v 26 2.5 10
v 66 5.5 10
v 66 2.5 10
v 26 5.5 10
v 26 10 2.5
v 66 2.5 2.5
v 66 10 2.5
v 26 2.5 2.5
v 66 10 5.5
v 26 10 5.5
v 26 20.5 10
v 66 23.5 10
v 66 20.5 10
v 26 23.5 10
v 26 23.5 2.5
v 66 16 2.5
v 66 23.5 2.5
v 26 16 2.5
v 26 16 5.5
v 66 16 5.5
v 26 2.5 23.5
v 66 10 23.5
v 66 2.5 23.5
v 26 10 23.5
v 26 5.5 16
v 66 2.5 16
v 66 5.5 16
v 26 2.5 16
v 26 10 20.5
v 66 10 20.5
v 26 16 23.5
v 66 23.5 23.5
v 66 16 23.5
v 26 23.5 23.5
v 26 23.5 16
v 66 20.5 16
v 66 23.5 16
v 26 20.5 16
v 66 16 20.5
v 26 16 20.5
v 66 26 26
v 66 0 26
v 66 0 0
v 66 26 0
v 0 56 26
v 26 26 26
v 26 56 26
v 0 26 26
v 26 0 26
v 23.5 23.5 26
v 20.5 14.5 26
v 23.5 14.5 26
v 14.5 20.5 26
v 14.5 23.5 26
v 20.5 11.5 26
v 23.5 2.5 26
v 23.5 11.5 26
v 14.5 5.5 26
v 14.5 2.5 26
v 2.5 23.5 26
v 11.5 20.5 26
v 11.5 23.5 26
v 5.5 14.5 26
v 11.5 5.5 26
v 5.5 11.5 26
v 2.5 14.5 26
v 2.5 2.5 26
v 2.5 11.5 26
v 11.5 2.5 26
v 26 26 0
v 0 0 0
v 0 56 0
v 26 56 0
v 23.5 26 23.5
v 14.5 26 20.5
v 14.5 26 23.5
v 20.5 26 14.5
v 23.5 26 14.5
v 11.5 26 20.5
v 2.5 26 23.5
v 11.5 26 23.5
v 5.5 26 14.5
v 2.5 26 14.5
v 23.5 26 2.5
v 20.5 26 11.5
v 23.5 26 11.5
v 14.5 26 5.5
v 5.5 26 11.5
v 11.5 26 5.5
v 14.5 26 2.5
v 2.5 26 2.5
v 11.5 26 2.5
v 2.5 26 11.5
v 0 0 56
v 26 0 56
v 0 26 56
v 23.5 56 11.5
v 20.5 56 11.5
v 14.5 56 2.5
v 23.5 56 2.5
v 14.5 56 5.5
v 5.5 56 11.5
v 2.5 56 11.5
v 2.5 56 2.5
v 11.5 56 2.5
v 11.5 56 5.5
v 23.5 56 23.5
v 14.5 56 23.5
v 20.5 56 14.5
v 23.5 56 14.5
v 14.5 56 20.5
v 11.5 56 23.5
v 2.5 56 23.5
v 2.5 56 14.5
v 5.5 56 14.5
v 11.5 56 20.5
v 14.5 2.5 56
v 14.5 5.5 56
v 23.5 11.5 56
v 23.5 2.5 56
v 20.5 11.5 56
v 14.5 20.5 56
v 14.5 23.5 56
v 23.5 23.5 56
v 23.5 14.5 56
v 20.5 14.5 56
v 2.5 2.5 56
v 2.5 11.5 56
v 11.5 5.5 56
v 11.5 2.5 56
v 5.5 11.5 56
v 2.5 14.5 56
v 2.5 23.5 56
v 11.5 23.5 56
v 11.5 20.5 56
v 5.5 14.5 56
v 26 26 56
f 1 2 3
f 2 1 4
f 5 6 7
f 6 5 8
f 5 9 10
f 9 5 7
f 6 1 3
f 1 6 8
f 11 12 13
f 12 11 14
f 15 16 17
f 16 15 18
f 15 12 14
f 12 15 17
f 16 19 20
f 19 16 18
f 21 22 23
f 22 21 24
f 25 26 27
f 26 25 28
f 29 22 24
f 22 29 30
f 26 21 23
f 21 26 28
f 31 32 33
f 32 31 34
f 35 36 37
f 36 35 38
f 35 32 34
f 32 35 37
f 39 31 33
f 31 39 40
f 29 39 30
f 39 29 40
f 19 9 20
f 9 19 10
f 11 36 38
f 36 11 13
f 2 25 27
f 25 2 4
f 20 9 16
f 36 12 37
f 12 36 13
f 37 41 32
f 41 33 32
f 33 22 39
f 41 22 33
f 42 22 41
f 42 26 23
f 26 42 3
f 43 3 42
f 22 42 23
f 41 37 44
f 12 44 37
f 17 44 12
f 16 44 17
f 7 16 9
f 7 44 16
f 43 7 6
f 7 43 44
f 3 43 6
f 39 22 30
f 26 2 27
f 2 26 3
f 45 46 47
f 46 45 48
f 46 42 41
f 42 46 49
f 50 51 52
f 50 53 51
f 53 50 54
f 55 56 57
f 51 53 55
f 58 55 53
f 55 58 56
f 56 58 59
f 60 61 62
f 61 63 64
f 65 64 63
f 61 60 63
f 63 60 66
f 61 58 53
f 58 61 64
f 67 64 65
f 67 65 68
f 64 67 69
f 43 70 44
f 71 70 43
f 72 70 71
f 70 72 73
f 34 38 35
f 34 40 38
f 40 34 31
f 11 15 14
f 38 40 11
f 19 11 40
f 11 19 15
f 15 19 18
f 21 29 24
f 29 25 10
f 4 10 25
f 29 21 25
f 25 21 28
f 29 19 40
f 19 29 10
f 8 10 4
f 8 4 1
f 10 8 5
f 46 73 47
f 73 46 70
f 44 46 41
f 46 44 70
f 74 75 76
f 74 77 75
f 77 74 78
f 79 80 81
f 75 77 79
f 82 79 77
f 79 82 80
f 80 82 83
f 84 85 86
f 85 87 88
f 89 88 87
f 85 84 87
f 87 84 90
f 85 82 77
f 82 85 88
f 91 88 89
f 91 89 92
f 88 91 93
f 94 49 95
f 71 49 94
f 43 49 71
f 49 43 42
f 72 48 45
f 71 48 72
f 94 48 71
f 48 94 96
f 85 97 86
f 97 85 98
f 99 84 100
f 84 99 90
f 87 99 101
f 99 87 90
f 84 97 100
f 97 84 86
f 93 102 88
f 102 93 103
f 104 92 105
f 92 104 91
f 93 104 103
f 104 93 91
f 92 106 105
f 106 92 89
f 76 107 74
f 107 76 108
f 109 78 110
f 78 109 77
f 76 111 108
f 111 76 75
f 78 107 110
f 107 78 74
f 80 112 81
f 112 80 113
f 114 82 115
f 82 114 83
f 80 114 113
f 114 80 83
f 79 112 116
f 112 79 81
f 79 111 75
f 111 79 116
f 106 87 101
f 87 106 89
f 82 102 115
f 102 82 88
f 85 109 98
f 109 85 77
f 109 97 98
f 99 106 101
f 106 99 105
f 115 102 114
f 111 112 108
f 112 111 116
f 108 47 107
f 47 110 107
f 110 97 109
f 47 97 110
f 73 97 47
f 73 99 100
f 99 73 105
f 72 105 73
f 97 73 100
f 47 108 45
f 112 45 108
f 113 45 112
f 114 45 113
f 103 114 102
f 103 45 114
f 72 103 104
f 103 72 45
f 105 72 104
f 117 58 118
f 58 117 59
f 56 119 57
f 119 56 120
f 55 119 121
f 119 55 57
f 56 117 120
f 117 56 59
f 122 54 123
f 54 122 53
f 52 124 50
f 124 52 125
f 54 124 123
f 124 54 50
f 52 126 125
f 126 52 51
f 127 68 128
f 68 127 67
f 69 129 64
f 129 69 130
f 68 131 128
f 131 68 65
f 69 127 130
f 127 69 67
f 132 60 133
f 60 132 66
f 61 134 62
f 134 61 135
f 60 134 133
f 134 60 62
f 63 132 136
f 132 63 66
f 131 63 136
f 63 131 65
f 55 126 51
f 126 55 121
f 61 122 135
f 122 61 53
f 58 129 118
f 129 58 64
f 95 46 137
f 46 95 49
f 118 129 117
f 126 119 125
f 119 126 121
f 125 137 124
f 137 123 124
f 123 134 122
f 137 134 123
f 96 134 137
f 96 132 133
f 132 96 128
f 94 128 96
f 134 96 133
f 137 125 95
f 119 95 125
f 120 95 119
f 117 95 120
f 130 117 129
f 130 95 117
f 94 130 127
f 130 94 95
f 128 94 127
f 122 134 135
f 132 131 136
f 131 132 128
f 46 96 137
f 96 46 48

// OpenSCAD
// file: modules_coin_0_4.scad
module tube_profile_X(
    x = 0, 
    y = 0, 
    z = 0,
    longueur_tube = 40,
    largeur_tube = 26,
    epaisseur_bloc = 3,
    largeur_bloc = 6,
    largeur_profile = 21,
    couleur_tube = "blue")
{
    epaisseur_tube = (largeur_tube-largeur_profile)/2;
    
    difference()
    {
        color(couleur_tube)
        translate([x,y,z])
        cube([longueur_tube, largeur_tube, largeur_tube]);
        
        translate([x,y+epaisseur_tube,z+epaisseur_tube])
        tube_profile(longueur_tube+1, epaisseur_bloc, largeur_bloc, largeur_profile);        
    }
}

module tube_profile(
    longueur, 
    epaisseur_bloc = 3, 
    largeur_bloc = 6, 
    largeur_profile = 20)
{
    ecart = (largeur_profile - largeur_bloc)/2;

    #translate([-1,0,0])
    cube([longueur+2,ecart,ecart]);
    
    #translate([-1,ecart+largeur_bloc,0])
    cube([longueur+2,ecart,ecart]);
    
    #translate([-1,0,ecart+largeur_bloc])
    cube([longueur+2,ecart,ecart]);
    
    #translate([-1,ecart+largeur_bloc,ecart+largeur_bloc])
    cube([longueur+2,ecart,ecart]);
    
    #translate([-1,epaisseur_bloc,epaisseur_bloc])
    cube([longueur+2,largeur_profile-2*epaisseur_bloc,largeur_profile-2*epaisseur_bloc]);
}
union()
{
color("green")
cube(26);

tube_profile_X(
    26,0,0,40, 26, 3, 6, 21);
}
// main file
include <modules_coin_0_4.scad>

longueur_tube = 30;
largeur_tube = 26;
largeur_profile = 21;

epaisseur_bloc = 3;
longueur_bloc = 6;

epaisseur_tube = (largeur_tube-largeur_profile)/2;

union()
{
    color("green")
    cube(largeur_tube);
    
    tube_profile_X(
        largeur_tube,0,0,longueur_tube, largeur_tube, epaisseur_bloc, longueur_bloc, largeur_profile);
  
    difference()
    {
        color("blue")
        translate([0,largeur_tube,0])
        cube([largeur_tube,longueur_tube,largeur_tube]);
    
        color("red")
        translate([largeur_tube-epaisseur_tube,largeur_tube,epaisseur_tube])
        rotate([0,0,90])
        tube_profile(longueur_tube+1, epaisseur_bloc, epaisseur_bloc, largeur_profile);
    }
    
    difference()
    {
        color("blue")
        translate([0,0,largeur_tube])
        cube([largeur_tube,largeur_tube,longueur_tube]);
        
        color("red")
        translate([largeur_tube-epaisseur_tube,epaisseur_tube,largeur_tube])
        rotate([0,-90,0])
        tube_profile(longueur_tube+1, epaisseur_bloc, epaisseur_bloc, largeur_profile);
    }
}
